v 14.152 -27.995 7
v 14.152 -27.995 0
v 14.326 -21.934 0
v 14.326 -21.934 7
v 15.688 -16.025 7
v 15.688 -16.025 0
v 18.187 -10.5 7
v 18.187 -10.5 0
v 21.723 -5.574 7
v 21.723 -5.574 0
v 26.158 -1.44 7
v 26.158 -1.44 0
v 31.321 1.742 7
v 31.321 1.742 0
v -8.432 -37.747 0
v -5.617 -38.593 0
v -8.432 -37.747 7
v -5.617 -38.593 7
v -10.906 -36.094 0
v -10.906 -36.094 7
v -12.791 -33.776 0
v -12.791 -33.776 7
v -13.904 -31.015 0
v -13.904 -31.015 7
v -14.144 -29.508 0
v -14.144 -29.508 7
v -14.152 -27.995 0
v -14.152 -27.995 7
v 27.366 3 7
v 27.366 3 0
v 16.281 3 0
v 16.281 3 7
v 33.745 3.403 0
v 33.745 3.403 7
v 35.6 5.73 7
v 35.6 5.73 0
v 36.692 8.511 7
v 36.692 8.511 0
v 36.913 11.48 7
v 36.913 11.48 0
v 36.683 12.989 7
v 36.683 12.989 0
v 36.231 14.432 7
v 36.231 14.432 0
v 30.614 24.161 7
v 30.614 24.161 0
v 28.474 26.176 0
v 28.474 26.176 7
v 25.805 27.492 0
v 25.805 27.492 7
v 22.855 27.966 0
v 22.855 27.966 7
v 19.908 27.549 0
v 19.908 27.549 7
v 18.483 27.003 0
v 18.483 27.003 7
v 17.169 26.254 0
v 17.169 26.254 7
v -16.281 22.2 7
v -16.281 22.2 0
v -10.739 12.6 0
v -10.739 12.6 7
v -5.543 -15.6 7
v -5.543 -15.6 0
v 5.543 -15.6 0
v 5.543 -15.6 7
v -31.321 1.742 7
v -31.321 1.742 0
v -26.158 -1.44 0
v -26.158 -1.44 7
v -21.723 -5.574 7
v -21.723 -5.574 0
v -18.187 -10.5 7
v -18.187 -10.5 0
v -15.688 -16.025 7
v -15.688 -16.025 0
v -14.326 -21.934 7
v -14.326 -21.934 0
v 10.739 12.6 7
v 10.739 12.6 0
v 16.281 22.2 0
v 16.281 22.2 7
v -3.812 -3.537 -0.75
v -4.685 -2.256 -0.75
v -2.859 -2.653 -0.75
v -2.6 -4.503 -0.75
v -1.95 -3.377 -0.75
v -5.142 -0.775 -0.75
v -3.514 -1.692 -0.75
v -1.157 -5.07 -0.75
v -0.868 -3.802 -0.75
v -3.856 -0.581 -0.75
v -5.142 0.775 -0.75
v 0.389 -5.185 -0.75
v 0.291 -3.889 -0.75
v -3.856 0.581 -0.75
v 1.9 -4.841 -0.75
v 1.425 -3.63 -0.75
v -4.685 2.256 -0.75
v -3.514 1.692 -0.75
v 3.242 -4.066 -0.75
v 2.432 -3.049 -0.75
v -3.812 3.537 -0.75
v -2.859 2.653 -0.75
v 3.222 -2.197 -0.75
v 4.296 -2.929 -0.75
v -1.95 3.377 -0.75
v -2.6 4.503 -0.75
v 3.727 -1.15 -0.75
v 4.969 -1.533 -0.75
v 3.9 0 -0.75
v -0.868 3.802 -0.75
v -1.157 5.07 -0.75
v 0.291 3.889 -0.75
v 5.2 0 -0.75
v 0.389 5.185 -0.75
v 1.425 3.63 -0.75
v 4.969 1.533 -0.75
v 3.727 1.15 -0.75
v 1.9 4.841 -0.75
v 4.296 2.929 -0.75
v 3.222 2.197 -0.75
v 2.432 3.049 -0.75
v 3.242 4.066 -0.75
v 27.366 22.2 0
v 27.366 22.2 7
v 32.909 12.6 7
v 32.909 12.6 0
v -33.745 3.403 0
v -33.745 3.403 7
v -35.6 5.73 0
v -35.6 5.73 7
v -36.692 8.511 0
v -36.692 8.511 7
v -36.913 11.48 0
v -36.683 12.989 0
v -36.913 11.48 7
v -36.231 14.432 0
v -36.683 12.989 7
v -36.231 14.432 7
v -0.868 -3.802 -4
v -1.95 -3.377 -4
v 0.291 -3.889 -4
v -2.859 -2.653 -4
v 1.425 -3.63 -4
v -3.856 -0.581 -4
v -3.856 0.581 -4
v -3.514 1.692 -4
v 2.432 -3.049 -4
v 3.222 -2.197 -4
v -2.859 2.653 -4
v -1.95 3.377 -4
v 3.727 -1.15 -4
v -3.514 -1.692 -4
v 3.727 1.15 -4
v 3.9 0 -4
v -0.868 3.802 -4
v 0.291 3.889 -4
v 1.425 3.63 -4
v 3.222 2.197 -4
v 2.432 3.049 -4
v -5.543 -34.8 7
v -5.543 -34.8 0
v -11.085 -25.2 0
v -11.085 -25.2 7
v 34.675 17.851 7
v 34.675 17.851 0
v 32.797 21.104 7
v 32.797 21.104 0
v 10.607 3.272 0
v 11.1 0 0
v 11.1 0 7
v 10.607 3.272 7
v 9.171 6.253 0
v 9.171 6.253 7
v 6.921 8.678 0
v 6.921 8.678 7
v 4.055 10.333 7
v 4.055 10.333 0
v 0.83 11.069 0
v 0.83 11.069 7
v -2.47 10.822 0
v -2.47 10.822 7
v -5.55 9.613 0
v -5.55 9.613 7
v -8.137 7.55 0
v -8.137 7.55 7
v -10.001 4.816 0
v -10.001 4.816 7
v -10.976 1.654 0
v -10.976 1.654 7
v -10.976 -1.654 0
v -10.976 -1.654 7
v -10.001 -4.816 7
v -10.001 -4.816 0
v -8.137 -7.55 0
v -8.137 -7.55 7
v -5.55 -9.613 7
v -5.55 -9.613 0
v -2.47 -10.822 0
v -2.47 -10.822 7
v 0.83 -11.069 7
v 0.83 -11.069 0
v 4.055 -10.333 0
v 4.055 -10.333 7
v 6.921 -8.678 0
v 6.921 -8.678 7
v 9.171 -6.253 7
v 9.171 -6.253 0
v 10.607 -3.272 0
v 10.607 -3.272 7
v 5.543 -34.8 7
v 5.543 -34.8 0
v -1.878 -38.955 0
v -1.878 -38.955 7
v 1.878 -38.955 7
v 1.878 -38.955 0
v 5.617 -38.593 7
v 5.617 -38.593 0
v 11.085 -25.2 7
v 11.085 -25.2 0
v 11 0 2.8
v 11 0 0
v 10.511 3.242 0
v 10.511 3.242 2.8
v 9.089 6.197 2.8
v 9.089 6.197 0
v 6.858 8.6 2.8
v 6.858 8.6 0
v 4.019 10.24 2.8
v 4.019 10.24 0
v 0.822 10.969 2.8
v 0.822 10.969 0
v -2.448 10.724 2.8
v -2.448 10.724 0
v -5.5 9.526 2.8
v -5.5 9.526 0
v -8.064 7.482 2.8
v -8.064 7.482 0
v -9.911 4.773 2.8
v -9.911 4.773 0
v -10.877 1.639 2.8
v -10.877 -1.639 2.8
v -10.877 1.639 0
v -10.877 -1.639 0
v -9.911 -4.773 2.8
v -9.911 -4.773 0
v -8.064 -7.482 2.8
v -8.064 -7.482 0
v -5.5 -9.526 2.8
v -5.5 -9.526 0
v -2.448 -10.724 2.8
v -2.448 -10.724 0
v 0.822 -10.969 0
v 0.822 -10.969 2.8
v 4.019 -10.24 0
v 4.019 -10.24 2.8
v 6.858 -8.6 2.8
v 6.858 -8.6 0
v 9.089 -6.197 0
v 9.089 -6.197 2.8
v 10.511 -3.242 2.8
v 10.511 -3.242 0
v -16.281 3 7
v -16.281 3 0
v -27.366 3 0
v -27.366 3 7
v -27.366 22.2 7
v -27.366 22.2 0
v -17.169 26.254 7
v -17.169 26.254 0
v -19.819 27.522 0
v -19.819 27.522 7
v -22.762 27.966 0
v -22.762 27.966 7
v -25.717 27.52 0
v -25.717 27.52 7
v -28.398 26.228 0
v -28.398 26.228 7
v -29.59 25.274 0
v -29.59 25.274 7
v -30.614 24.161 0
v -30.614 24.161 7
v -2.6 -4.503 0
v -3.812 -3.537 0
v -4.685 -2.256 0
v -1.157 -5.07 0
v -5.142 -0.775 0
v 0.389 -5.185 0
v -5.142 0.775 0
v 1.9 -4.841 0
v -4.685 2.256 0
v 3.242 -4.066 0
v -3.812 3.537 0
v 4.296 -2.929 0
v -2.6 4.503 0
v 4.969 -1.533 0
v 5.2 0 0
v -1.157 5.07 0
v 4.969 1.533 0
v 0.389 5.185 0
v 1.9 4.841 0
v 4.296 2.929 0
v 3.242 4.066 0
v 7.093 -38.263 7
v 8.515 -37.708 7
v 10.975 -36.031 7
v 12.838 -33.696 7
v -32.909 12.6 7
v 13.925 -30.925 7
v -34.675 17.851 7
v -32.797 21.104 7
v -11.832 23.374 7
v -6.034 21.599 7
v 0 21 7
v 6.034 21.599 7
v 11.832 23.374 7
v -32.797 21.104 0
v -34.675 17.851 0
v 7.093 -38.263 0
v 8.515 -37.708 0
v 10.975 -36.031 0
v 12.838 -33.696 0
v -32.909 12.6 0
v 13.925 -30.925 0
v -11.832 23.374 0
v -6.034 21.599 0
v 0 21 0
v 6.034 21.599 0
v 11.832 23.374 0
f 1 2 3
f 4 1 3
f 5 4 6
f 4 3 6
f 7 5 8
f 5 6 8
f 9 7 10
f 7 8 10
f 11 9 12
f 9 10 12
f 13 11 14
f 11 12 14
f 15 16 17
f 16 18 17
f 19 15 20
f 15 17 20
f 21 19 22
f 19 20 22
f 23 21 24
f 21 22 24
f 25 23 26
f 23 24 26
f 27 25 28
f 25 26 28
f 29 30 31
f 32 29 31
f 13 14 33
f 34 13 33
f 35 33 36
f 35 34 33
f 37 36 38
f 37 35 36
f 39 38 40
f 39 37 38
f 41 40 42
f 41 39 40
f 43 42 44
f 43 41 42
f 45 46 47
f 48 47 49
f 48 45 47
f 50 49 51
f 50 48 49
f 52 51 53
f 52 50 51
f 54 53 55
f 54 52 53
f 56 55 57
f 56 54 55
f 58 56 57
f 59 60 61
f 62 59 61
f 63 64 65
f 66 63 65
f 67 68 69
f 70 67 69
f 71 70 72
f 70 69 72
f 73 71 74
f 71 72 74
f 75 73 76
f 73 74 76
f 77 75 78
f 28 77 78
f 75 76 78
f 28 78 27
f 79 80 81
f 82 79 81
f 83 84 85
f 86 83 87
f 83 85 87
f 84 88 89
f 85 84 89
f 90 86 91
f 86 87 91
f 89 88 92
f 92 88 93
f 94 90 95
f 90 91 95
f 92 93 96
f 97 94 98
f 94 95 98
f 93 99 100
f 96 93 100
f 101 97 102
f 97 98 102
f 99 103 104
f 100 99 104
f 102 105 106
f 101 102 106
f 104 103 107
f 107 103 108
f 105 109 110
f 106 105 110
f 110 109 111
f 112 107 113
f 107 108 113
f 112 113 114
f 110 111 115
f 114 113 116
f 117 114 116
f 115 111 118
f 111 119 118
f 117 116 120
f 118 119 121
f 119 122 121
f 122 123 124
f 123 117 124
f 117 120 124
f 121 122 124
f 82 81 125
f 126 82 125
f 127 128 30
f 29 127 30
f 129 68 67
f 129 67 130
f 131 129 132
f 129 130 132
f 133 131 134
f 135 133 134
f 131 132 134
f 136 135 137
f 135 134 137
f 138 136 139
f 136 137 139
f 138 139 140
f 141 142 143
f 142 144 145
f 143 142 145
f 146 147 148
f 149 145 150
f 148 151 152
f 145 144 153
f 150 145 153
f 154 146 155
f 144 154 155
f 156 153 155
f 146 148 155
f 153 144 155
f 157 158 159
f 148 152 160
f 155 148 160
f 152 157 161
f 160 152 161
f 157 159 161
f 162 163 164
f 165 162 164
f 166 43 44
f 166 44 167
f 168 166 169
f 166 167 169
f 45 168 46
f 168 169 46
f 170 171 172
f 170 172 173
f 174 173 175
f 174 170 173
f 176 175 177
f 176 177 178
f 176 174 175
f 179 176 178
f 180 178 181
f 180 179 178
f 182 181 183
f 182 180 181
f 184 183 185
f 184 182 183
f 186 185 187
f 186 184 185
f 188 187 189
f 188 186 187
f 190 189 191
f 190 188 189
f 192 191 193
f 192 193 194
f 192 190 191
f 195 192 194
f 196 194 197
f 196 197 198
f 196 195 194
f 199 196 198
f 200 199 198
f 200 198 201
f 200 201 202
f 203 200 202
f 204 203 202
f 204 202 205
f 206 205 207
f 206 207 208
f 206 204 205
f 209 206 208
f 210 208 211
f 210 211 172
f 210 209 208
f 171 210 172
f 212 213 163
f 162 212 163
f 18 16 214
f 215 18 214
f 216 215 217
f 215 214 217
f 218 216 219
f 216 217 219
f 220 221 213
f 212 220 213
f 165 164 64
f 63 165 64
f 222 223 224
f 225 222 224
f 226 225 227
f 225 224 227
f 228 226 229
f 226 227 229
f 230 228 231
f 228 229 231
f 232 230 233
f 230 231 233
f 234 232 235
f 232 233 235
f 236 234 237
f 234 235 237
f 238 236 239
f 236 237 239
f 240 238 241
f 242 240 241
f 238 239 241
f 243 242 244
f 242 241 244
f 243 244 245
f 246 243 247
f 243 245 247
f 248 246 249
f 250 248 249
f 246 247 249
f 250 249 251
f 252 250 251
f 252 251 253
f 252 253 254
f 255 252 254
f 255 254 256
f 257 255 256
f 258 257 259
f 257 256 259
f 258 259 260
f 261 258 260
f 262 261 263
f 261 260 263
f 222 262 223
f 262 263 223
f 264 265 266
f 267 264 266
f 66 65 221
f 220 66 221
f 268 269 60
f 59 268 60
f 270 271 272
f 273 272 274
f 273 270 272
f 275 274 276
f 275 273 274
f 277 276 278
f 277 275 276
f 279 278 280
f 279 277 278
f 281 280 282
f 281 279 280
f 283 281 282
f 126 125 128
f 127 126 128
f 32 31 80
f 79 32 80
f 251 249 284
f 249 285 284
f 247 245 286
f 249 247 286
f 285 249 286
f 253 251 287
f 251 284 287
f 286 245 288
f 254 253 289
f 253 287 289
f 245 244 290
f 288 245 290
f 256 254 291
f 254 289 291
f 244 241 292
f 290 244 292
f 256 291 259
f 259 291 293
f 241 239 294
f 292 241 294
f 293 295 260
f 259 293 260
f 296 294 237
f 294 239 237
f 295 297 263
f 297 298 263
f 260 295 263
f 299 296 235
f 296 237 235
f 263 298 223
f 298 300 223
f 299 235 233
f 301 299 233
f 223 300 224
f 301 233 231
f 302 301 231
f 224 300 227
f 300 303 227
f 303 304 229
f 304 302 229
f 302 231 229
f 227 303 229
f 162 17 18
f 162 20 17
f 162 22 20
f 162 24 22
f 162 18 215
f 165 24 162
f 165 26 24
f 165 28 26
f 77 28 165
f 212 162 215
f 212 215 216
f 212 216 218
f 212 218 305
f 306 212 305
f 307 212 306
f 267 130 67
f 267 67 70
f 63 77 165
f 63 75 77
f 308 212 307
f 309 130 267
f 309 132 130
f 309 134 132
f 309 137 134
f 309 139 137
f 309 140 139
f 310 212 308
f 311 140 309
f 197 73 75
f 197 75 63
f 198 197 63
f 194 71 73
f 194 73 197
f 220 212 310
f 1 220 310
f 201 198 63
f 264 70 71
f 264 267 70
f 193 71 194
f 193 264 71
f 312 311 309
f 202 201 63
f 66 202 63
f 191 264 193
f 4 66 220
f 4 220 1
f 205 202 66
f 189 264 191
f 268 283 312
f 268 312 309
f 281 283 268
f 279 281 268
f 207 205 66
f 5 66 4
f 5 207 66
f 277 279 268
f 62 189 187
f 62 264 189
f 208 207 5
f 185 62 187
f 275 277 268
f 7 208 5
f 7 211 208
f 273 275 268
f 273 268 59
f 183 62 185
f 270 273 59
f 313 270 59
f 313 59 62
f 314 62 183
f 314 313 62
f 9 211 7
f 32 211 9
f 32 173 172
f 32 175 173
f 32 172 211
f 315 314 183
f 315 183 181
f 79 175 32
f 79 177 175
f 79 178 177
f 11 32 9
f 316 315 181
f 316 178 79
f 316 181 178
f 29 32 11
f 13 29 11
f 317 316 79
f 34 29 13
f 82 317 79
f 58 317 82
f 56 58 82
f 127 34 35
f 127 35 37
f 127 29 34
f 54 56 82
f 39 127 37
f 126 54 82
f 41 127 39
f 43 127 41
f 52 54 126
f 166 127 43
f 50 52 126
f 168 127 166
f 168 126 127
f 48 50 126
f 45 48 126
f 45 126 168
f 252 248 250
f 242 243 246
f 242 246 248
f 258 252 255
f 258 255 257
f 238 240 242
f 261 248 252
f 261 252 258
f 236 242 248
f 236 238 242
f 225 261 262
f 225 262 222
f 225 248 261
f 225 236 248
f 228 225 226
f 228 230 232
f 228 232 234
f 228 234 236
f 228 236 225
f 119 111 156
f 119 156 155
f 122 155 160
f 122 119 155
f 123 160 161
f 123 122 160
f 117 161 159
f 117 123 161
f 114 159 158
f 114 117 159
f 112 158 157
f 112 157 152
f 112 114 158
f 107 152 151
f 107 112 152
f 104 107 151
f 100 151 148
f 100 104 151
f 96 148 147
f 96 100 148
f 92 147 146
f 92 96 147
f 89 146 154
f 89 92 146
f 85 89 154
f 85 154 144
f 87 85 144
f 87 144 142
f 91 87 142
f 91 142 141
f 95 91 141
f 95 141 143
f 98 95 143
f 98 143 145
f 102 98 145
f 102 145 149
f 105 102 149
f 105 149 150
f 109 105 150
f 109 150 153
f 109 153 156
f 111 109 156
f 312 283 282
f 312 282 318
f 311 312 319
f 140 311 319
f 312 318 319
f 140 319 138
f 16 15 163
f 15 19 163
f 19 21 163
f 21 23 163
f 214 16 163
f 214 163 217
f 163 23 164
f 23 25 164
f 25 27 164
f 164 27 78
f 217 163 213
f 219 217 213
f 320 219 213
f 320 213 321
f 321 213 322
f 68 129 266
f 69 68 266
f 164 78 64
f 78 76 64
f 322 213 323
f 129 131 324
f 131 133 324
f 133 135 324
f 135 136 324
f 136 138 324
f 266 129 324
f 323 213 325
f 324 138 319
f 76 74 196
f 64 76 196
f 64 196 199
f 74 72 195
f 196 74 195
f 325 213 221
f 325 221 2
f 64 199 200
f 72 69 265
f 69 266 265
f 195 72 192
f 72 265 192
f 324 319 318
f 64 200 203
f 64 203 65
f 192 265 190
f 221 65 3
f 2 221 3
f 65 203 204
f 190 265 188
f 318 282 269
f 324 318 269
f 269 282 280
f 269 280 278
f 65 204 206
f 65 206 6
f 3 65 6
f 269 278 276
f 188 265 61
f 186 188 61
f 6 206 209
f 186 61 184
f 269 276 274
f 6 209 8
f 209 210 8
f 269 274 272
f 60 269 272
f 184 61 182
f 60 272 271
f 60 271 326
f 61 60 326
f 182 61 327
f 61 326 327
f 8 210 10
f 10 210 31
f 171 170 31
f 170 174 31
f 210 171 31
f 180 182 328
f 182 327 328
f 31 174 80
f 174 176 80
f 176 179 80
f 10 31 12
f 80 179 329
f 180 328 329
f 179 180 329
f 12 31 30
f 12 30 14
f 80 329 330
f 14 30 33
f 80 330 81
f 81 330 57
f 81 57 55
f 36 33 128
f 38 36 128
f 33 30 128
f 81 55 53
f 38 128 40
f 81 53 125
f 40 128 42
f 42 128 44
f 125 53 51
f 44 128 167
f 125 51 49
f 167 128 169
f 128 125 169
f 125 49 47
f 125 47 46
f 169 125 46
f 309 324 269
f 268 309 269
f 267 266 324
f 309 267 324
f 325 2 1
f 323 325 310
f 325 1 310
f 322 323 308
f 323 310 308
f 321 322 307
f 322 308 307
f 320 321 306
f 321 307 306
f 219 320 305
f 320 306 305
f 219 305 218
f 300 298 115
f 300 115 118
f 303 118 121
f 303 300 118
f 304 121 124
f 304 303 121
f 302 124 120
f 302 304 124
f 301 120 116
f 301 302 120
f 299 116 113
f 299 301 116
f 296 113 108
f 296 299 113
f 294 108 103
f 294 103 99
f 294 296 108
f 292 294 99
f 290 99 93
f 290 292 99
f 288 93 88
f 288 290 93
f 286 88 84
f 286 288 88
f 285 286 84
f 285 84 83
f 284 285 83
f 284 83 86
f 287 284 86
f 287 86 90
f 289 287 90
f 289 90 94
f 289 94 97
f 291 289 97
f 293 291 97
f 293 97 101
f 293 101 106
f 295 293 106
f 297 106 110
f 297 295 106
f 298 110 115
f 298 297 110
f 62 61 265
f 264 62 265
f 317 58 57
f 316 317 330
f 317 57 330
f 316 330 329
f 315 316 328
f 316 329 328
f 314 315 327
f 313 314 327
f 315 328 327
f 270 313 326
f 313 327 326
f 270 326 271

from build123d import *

# Parameters (mm, degrees)
F0_R     = 11.1
F1_DEPTH = 7
F2_R     = 10
F3_R     = 11
F3_R_2   = 3.9
F4_DEPTH = 2.8
F5_DEPTH = 4
F6_R     = 5.2
F6_R_2   = 3.9
F7_DEPTH = 0.75


with BuildPart() as f1:
    # F0 (on Top) → F1 (new body)
    with BuildSketch(Plane.XY):
        with BuildLine():
            ThreePointArc((15.7033939043, -35.6987873728), (18.1865334795, -10.5), (38.7677537013, 4.2498556396))
            ThreePointArc((38.7677537013, 4.2498556396), (33.7749907476, 19.5), (23.064359797, 31.4489317332))
            ThreePointArc((23.064359797, 31.4489317332), (0, 21), (-23.064359797, 31.4489317332))
            ThreePointArc((-23.064359797, 31.4489317332), (-33.7749907476, 19.5), (-38.7677537013, 4.2498556396))
            ThreePointArc((-38.7677537013, 4.2498556396), (-18.1865334795, -10.5), (-15.7033939043, -35.6987873728))
            ThreePointArc((-15.7033939043, -35.6987873728), (0, -39), (15.7033939043, -35.6987873728))
        make_face()
        Polygon((-5.5425625842, -15.6), (5.5425625842, -15.6), (11.0851251684, -25.2), (5.5425625842, -34.8), (-5.5425625842, -34.8), (-11.0851251684, -25.2), align=None, mode=Mode.SUBTRACT)
        Polygon((-27.3664027596, 3), (-32.9089653438, 12.6), (-27.3664027596, 22.2), (-16.2812775911, 22.2), (-10.7387150069, 12.6), (-16.2812775911, 3), align=None, mode=Mode.SUBTRACT)
        Circle(F0_R, mode=Mode.SUBTRACT)
        Polygon((16.2812775911, 22.2), (27.3664027596, 22.2), (32.9089653438, 12.6), (27.3664027596, 3), (16.2812775911, 3), (10.7387150069, 12.6), align=None, mode=Mode.SUBTRACT)
    extrude(amount=F1_DEPTH)

    # F2
    f2_edges = [f1.edges().sort_by_distance(p)[0] for p in [
        (-38.767754, 4.249856, 3.5),
        (-23.06436, 31.448932, 3.5),
        (23.06436, 31.448932, 3.5),
        (38.767754, 4.249856, 3.5),
        (15.703394, -35.698787, 3.5),
        (-15.703394, -35.698787, 3.5),
    ]]
    fillet(f2_edges, radius=F2_R)


with BuildPart() as f4:
    # F3 (on Top) → F4 (new body)
    with BuildSketch(Plane.XY):
        Circle(F3_R)
        Circle(F3_R_2, mode=Mode.SUBTRACT)
        Circle(F3_R_2)
    extrude(amount=F4_DEPTH)

    # F3 (on Top) → F5 (join)
    with BuildSketch(Plane.XY):
        Circle(F3_R_2)
    extrude(amount=-F5_DEPTH)

    # F6 (on face) → F7 (join)
    with BuildSketch(Plane.XY):
        Circle(F6_R)
        Circle(F6_R_2, mode=Mode.SUBTRACT)
    extrude(amount=-F7_DEPTH)


solid = Compound([f1.part, f4.part])
